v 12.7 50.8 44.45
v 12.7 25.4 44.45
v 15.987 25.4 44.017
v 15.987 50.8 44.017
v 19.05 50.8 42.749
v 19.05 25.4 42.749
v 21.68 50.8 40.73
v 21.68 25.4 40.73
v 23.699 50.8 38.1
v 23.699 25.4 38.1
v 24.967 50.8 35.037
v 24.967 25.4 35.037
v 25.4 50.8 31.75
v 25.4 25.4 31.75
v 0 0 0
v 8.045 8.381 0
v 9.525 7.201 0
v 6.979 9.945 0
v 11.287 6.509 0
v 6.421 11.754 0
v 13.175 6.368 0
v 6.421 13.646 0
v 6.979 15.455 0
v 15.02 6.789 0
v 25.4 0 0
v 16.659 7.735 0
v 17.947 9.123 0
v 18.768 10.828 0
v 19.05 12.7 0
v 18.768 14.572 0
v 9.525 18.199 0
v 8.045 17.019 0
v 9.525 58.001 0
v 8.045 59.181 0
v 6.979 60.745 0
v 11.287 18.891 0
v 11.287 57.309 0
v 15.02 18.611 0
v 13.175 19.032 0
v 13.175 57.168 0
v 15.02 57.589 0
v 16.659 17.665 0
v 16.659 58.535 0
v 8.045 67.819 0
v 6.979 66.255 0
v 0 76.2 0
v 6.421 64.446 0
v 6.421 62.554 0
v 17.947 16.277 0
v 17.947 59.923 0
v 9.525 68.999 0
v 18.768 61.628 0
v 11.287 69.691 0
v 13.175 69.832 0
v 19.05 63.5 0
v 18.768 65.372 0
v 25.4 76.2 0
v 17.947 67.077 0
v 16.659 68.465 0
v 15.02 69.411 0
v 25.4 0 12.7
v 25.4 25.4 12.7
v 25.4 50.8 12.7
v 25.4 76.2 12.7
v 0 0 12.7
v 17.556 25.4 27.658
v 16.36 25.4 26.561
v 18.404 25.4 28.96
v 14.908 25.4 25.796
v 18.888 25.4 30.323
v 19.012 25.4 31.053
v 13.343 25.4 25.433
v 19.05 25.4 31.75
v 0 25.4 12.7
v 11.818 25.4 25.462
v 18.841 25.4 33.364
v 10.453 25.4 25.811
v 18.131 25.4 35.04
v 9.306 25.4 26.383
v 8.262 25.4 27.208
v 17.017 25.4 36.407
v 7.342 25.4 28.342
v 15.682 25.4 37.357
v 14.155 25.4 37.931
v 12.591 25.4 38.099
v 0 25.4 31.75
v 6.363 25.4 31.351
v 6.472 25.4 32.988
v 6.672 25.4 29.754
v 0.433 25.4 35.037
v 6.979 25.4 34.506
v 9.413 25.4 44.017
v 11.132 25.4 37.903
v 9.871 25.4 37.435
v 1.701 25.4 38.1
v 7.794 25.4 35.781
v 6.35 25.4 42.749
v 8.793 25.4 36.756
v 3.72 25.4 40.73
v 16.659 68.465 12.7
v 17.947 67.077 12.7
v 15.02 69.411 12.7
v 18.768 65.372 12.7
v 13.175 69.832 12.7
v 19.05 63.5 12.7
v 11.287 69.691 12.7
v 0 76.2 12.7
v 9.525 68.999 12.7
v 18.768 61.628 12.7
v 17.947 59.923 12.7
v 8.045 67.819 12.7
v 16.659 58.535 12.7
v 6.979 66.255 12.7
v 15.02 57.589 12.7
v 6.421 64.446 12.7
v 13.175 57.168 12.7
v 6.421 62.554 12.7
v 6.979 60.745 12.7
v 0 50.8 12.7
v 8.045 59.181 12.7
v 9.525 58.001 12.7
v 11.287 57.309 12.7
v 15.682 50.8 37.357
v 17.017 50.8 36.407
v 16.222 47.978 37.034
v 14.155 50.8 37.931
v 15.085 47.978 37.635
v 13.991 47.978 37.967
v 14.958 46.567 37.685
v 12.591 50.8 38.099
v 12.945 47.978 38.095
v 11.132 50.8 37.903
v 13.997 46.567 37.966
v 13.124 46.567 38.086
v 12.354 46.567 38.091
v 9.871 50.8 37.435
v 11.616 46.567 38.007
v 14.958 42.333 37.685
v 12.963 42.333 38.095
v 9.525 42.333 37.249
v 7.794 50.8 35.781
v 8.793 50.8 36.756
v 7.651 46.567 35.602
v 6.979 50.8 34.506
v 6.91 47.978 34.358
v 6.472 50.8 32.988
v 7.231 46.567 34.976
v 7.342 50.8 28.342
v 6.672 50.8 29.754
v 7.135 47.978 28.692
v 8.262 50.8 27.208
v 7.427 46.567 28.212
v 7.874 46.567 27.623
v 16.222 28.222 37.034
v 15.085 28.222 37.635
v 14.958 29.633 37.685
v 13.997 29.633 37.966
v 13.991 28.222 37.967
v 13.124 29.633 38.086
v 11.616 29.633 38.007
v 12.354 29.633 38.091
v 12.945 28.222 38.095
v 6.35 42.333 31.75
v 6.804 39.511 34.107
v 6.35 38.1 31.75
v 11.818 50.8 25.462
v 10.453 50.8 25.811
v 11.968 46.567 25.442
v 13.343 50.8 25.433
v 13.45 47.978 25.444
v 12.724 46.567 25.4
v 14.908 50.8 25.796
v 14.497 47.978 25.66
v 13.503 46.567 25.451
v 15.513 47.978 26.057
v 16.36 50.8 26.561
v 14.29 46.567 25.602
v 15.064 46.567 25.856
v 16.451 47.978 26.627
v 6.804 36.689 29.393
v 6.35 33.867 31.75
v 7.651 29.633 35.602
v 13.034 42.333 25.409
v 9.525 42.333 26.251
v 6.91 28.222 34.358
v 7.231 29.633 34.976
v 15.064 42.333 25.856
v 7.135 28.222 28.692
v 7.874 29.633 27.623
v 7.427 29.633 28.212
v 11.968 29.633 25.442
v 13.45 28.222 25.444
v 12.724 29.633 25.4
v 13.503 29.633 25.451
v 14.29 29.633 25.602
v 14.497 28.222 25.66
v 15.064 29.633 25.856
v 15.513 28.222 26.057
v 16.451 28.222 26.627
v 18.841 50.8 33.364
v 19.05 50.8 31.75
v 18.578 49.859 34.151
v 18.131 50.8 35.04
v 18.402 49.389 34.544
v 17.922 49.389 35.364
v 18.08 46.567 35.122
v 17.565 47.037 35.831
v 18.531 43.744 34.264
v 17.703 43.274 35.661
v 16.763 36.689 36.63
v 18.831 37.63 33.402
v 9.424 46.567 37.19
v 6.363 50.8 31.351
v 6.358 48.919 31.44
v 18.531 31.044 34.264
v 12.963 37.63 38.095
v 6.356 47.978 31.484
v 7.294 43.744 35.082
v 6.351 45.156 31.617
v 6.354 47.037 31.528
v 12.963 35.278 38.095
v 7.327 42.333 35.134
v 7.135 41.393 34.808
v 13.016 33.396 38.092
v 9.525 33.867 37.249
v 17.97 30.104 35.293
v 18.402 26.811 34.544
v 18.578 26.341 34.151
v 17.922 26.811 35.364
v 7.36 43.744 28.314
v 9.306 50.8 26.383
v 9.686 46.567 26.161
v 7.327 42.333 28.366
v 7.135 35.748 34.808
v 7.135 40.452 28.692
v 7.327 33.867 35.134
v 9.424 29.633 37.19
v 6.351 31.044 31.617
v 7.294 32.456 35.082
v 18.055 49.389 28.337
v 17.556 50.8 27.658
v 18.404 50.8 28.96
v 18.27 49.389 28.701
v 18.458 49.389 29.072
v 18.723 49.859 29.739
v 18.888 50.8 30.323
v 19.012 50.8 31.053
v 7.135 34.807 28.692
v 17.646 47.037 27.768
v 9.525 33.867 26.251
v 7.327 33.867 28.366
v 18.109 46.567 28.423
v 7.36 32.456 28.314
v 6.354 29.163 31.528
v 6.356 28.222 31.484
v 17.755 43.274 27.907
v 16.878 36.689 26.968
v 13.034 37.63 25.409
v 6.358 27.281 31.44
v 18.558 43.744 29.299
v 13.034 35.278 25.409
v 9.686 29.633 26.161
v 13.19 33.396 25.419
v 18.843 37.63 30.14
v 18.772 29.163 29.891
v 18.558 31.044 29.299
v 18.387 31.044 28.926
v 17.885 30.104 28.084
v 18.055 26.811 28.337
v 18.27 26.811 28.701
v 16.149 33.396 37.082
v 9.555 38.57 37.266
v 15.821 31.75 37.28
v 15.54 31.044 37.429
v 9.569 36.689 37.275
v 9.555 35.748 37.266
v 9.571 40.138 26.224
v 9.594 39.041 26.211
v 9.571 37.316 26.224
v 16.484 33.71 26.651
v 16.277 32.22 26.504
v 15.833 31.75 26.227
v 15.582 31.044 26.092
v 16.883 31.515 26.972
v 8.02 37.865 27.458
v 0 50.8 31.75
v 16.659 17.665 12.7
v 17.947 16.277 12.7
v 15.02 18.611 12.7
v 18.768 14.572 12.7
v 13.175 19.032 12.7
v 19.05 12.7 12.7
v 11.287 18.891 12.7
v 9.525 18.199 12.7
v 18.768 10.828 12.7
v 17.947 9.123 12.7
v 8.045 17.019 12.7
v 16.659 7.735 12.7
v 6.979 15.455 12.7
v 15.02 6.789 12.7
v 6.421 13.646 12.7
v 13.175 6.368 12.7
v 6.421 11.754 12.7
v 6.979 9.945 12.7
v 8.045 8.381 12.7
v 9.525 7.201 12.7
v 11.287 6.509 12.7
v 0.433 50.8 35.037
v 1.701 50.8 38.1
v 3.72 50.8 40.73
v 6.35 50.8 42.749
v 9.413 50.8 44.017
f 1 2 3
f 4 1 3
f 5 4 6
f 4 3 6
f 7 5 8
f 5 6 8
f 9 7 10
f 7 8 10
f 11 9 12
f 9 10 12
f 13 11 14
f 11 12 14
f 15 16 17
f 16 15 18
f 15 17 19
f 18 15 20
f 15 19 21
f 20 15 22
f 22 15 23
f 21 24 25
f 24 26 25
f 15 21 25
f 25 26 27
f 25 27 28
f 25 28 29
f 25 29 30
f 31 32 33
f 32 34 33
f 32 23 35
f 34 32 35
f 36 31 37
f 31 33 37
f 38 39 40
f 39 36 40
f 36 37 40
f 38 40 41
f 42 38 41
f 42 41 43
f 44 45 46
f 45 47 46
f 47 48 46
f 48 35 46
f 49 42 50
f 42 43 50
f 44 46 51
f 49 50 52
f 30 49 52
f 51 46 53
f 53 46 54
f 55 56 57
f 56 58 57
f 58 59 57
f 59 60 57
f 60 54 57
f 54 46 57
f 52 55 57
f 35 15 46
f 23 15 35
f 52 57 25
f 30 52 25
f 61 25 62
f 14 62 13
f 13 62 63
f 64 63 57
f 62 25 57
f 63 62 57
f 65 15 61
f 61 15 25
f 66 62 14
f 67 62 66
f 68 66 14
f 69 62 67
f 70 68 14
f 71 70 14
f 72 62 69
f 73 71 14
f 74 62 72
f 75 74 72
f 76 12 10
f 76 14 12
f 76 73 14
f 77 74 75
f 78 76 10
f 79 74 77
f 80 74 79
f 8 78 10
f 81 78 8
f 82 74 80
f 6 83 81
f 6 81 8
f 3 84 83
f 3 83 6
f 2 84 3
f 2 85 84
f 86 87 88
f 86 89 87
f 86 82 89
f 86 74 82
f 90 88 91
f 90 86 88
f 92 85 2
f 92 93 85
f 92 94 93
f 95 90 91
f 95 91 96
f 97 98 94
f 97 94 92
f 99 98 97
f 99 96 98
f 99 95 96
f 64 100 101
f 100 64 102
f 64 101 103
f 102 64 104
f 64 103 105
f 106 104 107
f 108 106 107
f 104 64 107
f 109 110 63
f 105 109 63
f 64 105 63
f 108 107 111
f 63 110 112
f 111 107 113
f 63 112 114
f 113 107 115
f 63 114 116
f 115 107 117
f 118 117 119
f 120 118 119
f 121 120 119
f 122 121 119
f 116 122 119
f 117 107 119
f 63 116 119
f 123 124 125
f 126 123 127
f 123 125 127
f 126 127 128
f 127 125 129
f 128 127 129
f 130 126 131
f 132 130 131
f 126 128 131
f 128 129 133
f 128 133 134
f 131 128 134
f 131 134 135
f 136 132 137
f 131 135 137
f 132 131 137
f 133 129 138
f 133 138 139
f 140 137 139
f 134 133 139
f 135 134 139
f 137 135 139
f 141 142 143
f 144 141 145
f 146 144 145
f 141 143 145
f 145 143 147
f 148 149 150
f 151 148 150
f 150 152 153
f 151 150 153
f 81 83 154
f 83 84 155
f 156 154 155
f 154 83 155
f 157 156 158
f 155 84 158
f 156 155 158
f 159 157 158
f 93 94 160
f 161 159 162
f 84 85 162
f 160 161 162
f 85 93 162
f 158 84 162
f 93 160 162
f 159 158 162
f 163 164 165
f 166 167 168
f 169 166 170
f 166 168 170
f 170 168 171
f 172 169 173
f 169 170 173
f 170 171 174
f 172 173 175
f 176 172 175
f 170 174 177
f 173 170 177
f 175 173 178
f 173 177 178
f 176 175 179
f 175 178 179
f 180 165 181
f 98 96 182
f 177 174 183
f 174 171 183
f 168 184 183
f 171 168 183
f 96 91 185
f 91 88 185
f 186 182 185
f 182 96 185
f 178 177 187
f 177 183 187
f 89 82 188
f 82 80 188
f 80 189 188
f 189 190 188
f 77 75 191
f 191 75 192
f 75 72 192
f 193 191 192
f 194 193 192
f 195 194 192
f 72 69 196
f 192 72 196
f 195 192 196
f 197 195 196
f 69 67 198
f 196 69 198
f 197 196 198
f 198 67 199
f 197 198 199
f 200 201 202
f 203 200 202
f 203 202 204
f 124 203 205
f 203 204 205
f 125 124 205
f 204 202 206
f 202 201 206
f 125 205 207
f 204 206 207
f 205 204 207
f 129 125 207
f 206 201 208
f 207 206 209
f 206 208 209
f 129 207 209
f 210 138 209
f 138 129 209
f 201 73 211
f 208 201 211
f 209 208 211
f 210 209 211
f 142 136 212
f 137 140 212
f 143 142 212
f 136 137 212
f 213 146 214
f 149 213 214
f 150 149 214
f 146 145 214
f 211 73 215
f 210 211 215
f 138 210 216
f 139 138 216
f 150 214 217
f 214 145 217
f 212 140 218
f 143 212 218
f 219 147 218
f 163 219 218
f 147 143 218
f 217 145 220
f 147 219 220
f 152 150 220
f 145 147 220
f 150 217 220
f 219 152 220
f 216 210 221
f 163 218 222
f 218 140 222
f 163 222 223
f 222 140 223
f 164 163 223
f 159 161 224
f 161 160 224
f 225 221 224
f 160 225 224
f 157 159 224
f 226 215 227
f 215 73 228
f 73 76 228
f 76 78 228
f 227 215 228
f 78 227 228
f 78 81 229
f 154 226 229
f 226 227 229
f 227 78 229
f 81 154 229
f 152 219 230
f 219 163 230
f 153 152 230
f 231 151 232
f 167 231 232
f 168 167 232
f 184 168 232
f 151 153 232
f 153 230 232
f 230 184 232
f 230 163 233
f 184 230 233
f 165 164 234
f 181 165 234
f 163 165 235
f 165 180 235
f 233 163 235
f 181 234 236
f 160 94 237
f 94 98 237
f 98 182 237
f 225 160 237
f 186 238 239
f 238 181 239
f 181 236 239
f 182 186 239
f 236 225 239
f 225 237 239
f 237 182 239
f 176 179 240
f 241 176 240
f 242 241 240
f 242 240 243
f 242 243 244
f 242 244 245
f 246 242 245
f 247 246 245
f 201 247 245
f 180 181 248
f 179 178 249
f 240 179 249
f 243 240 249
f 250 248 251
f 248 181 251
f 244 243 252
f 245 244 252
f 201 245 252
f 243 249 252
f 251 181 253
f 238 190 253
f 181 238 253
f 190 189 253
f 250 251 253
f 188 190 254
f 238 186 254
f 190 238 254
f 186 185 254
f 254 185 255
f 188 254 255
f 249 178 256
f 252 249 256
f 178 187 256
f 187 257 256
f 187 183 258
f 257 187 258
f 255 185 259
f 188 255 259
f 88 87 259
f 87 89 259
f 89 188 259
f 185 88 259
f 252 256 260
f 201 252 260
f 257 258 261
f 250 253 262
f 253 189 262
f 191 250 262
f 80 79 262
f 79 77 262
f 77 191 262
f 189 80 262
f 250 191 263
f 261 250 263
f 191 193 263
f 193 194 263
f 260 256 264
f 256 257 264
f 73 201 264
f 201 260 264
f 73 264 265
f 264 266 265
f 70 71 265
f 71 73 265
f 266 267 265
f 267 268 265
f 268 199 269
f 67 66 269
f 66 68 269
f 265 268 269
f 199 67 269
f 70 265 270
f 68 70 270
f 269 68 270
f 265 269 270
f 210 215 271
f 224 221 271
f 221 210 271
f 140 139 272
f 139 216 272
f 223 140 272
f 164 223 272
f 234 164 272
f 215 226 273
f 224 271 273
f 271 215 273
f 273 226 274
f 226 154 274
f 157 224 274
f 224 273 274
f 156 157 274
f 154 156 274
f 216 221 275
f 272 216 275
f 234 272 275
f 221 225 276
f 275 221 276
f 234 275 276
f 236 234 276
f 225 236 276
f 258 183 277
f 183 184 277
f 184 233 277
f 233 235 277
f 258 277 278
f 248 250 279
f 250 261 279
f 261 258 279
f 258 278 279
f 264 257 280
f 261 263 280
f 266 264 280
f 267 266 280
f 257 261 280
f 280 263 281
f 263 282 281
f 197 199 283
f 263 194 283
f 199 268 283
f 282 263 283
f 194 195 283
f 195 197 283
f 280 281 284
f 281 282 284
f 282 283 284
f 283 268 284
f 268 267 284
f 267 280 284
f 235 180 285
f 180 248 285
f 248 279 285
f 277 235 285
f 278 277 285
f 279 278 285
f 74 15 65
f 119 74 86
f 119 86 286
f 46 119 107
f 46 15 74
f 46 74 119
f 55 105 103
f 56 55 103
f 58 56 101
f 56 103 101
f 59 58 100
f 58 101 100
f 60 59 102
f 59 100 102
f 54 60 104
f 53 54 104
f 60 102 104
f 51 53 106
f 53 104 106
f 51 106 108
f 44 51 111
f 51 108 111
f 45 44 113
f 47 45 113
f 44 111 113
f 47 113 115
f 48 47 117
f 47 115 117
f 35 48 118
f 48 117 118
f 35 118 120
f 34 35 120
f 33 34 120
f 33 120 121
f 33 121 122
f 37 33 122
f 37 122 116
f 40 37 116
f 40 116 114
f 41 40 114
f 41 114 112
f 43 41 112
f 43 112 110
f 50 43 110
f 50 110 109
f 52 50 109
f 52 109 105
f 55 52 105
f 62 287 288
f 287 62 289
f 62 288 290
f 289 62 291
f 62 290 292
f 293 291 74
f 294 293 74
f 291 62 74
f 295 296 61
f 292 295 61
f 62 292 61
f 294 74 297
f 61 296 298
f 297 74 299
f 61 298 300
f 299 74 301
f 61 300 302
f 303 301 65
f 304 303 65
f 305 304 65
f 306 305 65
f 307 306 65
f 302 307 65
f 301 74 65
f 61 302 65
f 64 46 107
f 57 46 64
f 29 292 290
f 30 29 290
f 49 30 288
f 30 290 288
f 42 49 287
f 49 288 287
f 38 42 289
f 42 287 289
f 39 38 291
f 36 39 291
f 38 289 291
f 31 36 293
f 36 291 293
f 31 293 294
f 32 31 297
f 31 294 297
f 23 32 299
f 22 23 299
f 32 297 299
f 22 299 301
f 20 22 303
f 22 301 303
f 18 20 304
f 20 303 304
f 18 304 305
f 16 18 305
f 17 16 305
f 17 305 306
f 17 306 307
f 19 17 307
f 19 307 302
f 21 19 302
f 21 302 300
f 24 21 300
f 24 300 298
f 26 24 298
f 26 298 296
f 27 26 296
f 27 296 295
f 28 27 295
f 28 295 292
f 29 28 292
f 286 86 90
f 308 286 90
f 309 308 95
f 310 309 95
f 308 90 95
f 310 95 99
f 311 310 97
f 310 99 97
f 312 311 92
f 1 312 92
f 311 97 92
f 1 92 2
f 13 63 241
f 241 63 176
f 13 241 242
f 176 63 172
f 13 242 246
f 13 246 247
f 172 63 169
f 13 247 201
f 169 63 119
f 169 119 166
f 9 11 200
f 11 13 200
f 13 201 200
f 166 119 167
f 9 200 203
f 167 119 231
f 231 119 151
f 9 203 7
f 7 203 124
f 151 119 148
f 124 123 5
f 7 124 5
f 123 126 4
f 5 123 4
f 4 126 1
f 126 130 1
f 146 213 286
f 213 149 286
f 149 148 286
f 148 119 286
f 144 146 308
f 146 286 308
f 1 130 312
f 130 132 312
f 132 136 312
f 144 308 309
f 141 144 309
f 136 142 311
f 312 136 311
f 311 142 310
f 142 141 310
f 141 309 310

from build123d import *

# Parameters (mm, degrees)
F0_W      = 25.4
F0_H      = 76.2
F1_DEPTH  = 44.45
F2_W      = 25.4
F2_H      = 31.75
F3_DEPTH  = 25.4
F5_DEPTH  = 25.4
F7_DEPTH  = 25.4
F8_R      = 6.35
F9_DEPTH  = 25.4
F10_R     = 6.35
F11_DEPTH = 25.4


with BuildPart() as f1:
    # F0 (on Top) → F1 (new body)
    with BuildSketch(Plane.XY):
        with Locations((12.7, 38.1)):
            Rectangle(F0_W, F0_H)
    extrude(amount=F1_DEPTH)

    # F2 (on face) → F3 (cut)
    with BuildSketch(Plane(origin=(0, 0, 0), x_dir=(0, -1, 0), z_dir=(-1, 0, 0))):
        with Locations((-63.5, 28.575)):
            Rectangle(F2_W, F2_H)
        with Locations((-12.7, 28.575)):
            Rectangle(F2_W, F2_H)
    extrude(amount=-F3_DEPTH, mode=Mode.SUBTRACT)

    # F4 (on face) → F5 (cut)
    with BuildSketch(Plane.XZ.offset(-25.4)):
        with BuildLine():
            ThreePointArc((0, 31.75), (3.719744, 40.730256), (12.7, 44.45))
            Line((12.7, 44.45), (0, 44.45))
            Line((0, 44.45), (0, 31.75))
        make_face()
        with BuildLine():
            ThreePointArc((12.7, 44.45), (21.680256, 40.730257), (25.4, 31.750001))
            Line((25.4, 31.750001), (25.4, 44.45))
            Line((25.4, 44.45), (12.7, 44.45))
        make_face()
    extrude(amount=-F5_DEPTH, mode=Mode.SUBTRACT)

    # F6 (on face) → F7 (cut)
    with BuildSketch(Plane.XZ.offset(-25.4)):
        with BuildLine():
            add(Edge.make_bspline(
                [(19.05, 31.75), (19.05, 42.748523), (9.525, 37.249261), (0, 31.75), (9.525, 26.250739), (19.05, 20.751477), (19.05, 31.75)],
                knots=[0, 0, 0, 2.094395, 2.094395, 4.18879, 4.18879, 6.283185, 6.283185, 6.283185], degree=2, weights=[1, 0.5, 1, 0.5, 1, 0.5, 1]))
        make_face()
    extrude(amount=-F7_DEPTH, mode=Mode.SUBTRACT)

    # F8 (on face) → F9 (cut)
    with BuildSketch(Plane.XY.offset(12.7)):
        with Locations((12.7, 12.7)):
            Circle(F8_R)
    extrude(amount=-F9_DEPTH, mode=Mode.SUBTRACT)

    # F10 (on face) → F11 (cut)
    with BuildSketch(Plane.XY.offset(12.7)):
        with Locations((12.7, 63.5)):
            Circle(F10_R)
    extrude(amount=-F11_DEPTH, mode=Mode.SUBTRACT)


solid = f1.part
